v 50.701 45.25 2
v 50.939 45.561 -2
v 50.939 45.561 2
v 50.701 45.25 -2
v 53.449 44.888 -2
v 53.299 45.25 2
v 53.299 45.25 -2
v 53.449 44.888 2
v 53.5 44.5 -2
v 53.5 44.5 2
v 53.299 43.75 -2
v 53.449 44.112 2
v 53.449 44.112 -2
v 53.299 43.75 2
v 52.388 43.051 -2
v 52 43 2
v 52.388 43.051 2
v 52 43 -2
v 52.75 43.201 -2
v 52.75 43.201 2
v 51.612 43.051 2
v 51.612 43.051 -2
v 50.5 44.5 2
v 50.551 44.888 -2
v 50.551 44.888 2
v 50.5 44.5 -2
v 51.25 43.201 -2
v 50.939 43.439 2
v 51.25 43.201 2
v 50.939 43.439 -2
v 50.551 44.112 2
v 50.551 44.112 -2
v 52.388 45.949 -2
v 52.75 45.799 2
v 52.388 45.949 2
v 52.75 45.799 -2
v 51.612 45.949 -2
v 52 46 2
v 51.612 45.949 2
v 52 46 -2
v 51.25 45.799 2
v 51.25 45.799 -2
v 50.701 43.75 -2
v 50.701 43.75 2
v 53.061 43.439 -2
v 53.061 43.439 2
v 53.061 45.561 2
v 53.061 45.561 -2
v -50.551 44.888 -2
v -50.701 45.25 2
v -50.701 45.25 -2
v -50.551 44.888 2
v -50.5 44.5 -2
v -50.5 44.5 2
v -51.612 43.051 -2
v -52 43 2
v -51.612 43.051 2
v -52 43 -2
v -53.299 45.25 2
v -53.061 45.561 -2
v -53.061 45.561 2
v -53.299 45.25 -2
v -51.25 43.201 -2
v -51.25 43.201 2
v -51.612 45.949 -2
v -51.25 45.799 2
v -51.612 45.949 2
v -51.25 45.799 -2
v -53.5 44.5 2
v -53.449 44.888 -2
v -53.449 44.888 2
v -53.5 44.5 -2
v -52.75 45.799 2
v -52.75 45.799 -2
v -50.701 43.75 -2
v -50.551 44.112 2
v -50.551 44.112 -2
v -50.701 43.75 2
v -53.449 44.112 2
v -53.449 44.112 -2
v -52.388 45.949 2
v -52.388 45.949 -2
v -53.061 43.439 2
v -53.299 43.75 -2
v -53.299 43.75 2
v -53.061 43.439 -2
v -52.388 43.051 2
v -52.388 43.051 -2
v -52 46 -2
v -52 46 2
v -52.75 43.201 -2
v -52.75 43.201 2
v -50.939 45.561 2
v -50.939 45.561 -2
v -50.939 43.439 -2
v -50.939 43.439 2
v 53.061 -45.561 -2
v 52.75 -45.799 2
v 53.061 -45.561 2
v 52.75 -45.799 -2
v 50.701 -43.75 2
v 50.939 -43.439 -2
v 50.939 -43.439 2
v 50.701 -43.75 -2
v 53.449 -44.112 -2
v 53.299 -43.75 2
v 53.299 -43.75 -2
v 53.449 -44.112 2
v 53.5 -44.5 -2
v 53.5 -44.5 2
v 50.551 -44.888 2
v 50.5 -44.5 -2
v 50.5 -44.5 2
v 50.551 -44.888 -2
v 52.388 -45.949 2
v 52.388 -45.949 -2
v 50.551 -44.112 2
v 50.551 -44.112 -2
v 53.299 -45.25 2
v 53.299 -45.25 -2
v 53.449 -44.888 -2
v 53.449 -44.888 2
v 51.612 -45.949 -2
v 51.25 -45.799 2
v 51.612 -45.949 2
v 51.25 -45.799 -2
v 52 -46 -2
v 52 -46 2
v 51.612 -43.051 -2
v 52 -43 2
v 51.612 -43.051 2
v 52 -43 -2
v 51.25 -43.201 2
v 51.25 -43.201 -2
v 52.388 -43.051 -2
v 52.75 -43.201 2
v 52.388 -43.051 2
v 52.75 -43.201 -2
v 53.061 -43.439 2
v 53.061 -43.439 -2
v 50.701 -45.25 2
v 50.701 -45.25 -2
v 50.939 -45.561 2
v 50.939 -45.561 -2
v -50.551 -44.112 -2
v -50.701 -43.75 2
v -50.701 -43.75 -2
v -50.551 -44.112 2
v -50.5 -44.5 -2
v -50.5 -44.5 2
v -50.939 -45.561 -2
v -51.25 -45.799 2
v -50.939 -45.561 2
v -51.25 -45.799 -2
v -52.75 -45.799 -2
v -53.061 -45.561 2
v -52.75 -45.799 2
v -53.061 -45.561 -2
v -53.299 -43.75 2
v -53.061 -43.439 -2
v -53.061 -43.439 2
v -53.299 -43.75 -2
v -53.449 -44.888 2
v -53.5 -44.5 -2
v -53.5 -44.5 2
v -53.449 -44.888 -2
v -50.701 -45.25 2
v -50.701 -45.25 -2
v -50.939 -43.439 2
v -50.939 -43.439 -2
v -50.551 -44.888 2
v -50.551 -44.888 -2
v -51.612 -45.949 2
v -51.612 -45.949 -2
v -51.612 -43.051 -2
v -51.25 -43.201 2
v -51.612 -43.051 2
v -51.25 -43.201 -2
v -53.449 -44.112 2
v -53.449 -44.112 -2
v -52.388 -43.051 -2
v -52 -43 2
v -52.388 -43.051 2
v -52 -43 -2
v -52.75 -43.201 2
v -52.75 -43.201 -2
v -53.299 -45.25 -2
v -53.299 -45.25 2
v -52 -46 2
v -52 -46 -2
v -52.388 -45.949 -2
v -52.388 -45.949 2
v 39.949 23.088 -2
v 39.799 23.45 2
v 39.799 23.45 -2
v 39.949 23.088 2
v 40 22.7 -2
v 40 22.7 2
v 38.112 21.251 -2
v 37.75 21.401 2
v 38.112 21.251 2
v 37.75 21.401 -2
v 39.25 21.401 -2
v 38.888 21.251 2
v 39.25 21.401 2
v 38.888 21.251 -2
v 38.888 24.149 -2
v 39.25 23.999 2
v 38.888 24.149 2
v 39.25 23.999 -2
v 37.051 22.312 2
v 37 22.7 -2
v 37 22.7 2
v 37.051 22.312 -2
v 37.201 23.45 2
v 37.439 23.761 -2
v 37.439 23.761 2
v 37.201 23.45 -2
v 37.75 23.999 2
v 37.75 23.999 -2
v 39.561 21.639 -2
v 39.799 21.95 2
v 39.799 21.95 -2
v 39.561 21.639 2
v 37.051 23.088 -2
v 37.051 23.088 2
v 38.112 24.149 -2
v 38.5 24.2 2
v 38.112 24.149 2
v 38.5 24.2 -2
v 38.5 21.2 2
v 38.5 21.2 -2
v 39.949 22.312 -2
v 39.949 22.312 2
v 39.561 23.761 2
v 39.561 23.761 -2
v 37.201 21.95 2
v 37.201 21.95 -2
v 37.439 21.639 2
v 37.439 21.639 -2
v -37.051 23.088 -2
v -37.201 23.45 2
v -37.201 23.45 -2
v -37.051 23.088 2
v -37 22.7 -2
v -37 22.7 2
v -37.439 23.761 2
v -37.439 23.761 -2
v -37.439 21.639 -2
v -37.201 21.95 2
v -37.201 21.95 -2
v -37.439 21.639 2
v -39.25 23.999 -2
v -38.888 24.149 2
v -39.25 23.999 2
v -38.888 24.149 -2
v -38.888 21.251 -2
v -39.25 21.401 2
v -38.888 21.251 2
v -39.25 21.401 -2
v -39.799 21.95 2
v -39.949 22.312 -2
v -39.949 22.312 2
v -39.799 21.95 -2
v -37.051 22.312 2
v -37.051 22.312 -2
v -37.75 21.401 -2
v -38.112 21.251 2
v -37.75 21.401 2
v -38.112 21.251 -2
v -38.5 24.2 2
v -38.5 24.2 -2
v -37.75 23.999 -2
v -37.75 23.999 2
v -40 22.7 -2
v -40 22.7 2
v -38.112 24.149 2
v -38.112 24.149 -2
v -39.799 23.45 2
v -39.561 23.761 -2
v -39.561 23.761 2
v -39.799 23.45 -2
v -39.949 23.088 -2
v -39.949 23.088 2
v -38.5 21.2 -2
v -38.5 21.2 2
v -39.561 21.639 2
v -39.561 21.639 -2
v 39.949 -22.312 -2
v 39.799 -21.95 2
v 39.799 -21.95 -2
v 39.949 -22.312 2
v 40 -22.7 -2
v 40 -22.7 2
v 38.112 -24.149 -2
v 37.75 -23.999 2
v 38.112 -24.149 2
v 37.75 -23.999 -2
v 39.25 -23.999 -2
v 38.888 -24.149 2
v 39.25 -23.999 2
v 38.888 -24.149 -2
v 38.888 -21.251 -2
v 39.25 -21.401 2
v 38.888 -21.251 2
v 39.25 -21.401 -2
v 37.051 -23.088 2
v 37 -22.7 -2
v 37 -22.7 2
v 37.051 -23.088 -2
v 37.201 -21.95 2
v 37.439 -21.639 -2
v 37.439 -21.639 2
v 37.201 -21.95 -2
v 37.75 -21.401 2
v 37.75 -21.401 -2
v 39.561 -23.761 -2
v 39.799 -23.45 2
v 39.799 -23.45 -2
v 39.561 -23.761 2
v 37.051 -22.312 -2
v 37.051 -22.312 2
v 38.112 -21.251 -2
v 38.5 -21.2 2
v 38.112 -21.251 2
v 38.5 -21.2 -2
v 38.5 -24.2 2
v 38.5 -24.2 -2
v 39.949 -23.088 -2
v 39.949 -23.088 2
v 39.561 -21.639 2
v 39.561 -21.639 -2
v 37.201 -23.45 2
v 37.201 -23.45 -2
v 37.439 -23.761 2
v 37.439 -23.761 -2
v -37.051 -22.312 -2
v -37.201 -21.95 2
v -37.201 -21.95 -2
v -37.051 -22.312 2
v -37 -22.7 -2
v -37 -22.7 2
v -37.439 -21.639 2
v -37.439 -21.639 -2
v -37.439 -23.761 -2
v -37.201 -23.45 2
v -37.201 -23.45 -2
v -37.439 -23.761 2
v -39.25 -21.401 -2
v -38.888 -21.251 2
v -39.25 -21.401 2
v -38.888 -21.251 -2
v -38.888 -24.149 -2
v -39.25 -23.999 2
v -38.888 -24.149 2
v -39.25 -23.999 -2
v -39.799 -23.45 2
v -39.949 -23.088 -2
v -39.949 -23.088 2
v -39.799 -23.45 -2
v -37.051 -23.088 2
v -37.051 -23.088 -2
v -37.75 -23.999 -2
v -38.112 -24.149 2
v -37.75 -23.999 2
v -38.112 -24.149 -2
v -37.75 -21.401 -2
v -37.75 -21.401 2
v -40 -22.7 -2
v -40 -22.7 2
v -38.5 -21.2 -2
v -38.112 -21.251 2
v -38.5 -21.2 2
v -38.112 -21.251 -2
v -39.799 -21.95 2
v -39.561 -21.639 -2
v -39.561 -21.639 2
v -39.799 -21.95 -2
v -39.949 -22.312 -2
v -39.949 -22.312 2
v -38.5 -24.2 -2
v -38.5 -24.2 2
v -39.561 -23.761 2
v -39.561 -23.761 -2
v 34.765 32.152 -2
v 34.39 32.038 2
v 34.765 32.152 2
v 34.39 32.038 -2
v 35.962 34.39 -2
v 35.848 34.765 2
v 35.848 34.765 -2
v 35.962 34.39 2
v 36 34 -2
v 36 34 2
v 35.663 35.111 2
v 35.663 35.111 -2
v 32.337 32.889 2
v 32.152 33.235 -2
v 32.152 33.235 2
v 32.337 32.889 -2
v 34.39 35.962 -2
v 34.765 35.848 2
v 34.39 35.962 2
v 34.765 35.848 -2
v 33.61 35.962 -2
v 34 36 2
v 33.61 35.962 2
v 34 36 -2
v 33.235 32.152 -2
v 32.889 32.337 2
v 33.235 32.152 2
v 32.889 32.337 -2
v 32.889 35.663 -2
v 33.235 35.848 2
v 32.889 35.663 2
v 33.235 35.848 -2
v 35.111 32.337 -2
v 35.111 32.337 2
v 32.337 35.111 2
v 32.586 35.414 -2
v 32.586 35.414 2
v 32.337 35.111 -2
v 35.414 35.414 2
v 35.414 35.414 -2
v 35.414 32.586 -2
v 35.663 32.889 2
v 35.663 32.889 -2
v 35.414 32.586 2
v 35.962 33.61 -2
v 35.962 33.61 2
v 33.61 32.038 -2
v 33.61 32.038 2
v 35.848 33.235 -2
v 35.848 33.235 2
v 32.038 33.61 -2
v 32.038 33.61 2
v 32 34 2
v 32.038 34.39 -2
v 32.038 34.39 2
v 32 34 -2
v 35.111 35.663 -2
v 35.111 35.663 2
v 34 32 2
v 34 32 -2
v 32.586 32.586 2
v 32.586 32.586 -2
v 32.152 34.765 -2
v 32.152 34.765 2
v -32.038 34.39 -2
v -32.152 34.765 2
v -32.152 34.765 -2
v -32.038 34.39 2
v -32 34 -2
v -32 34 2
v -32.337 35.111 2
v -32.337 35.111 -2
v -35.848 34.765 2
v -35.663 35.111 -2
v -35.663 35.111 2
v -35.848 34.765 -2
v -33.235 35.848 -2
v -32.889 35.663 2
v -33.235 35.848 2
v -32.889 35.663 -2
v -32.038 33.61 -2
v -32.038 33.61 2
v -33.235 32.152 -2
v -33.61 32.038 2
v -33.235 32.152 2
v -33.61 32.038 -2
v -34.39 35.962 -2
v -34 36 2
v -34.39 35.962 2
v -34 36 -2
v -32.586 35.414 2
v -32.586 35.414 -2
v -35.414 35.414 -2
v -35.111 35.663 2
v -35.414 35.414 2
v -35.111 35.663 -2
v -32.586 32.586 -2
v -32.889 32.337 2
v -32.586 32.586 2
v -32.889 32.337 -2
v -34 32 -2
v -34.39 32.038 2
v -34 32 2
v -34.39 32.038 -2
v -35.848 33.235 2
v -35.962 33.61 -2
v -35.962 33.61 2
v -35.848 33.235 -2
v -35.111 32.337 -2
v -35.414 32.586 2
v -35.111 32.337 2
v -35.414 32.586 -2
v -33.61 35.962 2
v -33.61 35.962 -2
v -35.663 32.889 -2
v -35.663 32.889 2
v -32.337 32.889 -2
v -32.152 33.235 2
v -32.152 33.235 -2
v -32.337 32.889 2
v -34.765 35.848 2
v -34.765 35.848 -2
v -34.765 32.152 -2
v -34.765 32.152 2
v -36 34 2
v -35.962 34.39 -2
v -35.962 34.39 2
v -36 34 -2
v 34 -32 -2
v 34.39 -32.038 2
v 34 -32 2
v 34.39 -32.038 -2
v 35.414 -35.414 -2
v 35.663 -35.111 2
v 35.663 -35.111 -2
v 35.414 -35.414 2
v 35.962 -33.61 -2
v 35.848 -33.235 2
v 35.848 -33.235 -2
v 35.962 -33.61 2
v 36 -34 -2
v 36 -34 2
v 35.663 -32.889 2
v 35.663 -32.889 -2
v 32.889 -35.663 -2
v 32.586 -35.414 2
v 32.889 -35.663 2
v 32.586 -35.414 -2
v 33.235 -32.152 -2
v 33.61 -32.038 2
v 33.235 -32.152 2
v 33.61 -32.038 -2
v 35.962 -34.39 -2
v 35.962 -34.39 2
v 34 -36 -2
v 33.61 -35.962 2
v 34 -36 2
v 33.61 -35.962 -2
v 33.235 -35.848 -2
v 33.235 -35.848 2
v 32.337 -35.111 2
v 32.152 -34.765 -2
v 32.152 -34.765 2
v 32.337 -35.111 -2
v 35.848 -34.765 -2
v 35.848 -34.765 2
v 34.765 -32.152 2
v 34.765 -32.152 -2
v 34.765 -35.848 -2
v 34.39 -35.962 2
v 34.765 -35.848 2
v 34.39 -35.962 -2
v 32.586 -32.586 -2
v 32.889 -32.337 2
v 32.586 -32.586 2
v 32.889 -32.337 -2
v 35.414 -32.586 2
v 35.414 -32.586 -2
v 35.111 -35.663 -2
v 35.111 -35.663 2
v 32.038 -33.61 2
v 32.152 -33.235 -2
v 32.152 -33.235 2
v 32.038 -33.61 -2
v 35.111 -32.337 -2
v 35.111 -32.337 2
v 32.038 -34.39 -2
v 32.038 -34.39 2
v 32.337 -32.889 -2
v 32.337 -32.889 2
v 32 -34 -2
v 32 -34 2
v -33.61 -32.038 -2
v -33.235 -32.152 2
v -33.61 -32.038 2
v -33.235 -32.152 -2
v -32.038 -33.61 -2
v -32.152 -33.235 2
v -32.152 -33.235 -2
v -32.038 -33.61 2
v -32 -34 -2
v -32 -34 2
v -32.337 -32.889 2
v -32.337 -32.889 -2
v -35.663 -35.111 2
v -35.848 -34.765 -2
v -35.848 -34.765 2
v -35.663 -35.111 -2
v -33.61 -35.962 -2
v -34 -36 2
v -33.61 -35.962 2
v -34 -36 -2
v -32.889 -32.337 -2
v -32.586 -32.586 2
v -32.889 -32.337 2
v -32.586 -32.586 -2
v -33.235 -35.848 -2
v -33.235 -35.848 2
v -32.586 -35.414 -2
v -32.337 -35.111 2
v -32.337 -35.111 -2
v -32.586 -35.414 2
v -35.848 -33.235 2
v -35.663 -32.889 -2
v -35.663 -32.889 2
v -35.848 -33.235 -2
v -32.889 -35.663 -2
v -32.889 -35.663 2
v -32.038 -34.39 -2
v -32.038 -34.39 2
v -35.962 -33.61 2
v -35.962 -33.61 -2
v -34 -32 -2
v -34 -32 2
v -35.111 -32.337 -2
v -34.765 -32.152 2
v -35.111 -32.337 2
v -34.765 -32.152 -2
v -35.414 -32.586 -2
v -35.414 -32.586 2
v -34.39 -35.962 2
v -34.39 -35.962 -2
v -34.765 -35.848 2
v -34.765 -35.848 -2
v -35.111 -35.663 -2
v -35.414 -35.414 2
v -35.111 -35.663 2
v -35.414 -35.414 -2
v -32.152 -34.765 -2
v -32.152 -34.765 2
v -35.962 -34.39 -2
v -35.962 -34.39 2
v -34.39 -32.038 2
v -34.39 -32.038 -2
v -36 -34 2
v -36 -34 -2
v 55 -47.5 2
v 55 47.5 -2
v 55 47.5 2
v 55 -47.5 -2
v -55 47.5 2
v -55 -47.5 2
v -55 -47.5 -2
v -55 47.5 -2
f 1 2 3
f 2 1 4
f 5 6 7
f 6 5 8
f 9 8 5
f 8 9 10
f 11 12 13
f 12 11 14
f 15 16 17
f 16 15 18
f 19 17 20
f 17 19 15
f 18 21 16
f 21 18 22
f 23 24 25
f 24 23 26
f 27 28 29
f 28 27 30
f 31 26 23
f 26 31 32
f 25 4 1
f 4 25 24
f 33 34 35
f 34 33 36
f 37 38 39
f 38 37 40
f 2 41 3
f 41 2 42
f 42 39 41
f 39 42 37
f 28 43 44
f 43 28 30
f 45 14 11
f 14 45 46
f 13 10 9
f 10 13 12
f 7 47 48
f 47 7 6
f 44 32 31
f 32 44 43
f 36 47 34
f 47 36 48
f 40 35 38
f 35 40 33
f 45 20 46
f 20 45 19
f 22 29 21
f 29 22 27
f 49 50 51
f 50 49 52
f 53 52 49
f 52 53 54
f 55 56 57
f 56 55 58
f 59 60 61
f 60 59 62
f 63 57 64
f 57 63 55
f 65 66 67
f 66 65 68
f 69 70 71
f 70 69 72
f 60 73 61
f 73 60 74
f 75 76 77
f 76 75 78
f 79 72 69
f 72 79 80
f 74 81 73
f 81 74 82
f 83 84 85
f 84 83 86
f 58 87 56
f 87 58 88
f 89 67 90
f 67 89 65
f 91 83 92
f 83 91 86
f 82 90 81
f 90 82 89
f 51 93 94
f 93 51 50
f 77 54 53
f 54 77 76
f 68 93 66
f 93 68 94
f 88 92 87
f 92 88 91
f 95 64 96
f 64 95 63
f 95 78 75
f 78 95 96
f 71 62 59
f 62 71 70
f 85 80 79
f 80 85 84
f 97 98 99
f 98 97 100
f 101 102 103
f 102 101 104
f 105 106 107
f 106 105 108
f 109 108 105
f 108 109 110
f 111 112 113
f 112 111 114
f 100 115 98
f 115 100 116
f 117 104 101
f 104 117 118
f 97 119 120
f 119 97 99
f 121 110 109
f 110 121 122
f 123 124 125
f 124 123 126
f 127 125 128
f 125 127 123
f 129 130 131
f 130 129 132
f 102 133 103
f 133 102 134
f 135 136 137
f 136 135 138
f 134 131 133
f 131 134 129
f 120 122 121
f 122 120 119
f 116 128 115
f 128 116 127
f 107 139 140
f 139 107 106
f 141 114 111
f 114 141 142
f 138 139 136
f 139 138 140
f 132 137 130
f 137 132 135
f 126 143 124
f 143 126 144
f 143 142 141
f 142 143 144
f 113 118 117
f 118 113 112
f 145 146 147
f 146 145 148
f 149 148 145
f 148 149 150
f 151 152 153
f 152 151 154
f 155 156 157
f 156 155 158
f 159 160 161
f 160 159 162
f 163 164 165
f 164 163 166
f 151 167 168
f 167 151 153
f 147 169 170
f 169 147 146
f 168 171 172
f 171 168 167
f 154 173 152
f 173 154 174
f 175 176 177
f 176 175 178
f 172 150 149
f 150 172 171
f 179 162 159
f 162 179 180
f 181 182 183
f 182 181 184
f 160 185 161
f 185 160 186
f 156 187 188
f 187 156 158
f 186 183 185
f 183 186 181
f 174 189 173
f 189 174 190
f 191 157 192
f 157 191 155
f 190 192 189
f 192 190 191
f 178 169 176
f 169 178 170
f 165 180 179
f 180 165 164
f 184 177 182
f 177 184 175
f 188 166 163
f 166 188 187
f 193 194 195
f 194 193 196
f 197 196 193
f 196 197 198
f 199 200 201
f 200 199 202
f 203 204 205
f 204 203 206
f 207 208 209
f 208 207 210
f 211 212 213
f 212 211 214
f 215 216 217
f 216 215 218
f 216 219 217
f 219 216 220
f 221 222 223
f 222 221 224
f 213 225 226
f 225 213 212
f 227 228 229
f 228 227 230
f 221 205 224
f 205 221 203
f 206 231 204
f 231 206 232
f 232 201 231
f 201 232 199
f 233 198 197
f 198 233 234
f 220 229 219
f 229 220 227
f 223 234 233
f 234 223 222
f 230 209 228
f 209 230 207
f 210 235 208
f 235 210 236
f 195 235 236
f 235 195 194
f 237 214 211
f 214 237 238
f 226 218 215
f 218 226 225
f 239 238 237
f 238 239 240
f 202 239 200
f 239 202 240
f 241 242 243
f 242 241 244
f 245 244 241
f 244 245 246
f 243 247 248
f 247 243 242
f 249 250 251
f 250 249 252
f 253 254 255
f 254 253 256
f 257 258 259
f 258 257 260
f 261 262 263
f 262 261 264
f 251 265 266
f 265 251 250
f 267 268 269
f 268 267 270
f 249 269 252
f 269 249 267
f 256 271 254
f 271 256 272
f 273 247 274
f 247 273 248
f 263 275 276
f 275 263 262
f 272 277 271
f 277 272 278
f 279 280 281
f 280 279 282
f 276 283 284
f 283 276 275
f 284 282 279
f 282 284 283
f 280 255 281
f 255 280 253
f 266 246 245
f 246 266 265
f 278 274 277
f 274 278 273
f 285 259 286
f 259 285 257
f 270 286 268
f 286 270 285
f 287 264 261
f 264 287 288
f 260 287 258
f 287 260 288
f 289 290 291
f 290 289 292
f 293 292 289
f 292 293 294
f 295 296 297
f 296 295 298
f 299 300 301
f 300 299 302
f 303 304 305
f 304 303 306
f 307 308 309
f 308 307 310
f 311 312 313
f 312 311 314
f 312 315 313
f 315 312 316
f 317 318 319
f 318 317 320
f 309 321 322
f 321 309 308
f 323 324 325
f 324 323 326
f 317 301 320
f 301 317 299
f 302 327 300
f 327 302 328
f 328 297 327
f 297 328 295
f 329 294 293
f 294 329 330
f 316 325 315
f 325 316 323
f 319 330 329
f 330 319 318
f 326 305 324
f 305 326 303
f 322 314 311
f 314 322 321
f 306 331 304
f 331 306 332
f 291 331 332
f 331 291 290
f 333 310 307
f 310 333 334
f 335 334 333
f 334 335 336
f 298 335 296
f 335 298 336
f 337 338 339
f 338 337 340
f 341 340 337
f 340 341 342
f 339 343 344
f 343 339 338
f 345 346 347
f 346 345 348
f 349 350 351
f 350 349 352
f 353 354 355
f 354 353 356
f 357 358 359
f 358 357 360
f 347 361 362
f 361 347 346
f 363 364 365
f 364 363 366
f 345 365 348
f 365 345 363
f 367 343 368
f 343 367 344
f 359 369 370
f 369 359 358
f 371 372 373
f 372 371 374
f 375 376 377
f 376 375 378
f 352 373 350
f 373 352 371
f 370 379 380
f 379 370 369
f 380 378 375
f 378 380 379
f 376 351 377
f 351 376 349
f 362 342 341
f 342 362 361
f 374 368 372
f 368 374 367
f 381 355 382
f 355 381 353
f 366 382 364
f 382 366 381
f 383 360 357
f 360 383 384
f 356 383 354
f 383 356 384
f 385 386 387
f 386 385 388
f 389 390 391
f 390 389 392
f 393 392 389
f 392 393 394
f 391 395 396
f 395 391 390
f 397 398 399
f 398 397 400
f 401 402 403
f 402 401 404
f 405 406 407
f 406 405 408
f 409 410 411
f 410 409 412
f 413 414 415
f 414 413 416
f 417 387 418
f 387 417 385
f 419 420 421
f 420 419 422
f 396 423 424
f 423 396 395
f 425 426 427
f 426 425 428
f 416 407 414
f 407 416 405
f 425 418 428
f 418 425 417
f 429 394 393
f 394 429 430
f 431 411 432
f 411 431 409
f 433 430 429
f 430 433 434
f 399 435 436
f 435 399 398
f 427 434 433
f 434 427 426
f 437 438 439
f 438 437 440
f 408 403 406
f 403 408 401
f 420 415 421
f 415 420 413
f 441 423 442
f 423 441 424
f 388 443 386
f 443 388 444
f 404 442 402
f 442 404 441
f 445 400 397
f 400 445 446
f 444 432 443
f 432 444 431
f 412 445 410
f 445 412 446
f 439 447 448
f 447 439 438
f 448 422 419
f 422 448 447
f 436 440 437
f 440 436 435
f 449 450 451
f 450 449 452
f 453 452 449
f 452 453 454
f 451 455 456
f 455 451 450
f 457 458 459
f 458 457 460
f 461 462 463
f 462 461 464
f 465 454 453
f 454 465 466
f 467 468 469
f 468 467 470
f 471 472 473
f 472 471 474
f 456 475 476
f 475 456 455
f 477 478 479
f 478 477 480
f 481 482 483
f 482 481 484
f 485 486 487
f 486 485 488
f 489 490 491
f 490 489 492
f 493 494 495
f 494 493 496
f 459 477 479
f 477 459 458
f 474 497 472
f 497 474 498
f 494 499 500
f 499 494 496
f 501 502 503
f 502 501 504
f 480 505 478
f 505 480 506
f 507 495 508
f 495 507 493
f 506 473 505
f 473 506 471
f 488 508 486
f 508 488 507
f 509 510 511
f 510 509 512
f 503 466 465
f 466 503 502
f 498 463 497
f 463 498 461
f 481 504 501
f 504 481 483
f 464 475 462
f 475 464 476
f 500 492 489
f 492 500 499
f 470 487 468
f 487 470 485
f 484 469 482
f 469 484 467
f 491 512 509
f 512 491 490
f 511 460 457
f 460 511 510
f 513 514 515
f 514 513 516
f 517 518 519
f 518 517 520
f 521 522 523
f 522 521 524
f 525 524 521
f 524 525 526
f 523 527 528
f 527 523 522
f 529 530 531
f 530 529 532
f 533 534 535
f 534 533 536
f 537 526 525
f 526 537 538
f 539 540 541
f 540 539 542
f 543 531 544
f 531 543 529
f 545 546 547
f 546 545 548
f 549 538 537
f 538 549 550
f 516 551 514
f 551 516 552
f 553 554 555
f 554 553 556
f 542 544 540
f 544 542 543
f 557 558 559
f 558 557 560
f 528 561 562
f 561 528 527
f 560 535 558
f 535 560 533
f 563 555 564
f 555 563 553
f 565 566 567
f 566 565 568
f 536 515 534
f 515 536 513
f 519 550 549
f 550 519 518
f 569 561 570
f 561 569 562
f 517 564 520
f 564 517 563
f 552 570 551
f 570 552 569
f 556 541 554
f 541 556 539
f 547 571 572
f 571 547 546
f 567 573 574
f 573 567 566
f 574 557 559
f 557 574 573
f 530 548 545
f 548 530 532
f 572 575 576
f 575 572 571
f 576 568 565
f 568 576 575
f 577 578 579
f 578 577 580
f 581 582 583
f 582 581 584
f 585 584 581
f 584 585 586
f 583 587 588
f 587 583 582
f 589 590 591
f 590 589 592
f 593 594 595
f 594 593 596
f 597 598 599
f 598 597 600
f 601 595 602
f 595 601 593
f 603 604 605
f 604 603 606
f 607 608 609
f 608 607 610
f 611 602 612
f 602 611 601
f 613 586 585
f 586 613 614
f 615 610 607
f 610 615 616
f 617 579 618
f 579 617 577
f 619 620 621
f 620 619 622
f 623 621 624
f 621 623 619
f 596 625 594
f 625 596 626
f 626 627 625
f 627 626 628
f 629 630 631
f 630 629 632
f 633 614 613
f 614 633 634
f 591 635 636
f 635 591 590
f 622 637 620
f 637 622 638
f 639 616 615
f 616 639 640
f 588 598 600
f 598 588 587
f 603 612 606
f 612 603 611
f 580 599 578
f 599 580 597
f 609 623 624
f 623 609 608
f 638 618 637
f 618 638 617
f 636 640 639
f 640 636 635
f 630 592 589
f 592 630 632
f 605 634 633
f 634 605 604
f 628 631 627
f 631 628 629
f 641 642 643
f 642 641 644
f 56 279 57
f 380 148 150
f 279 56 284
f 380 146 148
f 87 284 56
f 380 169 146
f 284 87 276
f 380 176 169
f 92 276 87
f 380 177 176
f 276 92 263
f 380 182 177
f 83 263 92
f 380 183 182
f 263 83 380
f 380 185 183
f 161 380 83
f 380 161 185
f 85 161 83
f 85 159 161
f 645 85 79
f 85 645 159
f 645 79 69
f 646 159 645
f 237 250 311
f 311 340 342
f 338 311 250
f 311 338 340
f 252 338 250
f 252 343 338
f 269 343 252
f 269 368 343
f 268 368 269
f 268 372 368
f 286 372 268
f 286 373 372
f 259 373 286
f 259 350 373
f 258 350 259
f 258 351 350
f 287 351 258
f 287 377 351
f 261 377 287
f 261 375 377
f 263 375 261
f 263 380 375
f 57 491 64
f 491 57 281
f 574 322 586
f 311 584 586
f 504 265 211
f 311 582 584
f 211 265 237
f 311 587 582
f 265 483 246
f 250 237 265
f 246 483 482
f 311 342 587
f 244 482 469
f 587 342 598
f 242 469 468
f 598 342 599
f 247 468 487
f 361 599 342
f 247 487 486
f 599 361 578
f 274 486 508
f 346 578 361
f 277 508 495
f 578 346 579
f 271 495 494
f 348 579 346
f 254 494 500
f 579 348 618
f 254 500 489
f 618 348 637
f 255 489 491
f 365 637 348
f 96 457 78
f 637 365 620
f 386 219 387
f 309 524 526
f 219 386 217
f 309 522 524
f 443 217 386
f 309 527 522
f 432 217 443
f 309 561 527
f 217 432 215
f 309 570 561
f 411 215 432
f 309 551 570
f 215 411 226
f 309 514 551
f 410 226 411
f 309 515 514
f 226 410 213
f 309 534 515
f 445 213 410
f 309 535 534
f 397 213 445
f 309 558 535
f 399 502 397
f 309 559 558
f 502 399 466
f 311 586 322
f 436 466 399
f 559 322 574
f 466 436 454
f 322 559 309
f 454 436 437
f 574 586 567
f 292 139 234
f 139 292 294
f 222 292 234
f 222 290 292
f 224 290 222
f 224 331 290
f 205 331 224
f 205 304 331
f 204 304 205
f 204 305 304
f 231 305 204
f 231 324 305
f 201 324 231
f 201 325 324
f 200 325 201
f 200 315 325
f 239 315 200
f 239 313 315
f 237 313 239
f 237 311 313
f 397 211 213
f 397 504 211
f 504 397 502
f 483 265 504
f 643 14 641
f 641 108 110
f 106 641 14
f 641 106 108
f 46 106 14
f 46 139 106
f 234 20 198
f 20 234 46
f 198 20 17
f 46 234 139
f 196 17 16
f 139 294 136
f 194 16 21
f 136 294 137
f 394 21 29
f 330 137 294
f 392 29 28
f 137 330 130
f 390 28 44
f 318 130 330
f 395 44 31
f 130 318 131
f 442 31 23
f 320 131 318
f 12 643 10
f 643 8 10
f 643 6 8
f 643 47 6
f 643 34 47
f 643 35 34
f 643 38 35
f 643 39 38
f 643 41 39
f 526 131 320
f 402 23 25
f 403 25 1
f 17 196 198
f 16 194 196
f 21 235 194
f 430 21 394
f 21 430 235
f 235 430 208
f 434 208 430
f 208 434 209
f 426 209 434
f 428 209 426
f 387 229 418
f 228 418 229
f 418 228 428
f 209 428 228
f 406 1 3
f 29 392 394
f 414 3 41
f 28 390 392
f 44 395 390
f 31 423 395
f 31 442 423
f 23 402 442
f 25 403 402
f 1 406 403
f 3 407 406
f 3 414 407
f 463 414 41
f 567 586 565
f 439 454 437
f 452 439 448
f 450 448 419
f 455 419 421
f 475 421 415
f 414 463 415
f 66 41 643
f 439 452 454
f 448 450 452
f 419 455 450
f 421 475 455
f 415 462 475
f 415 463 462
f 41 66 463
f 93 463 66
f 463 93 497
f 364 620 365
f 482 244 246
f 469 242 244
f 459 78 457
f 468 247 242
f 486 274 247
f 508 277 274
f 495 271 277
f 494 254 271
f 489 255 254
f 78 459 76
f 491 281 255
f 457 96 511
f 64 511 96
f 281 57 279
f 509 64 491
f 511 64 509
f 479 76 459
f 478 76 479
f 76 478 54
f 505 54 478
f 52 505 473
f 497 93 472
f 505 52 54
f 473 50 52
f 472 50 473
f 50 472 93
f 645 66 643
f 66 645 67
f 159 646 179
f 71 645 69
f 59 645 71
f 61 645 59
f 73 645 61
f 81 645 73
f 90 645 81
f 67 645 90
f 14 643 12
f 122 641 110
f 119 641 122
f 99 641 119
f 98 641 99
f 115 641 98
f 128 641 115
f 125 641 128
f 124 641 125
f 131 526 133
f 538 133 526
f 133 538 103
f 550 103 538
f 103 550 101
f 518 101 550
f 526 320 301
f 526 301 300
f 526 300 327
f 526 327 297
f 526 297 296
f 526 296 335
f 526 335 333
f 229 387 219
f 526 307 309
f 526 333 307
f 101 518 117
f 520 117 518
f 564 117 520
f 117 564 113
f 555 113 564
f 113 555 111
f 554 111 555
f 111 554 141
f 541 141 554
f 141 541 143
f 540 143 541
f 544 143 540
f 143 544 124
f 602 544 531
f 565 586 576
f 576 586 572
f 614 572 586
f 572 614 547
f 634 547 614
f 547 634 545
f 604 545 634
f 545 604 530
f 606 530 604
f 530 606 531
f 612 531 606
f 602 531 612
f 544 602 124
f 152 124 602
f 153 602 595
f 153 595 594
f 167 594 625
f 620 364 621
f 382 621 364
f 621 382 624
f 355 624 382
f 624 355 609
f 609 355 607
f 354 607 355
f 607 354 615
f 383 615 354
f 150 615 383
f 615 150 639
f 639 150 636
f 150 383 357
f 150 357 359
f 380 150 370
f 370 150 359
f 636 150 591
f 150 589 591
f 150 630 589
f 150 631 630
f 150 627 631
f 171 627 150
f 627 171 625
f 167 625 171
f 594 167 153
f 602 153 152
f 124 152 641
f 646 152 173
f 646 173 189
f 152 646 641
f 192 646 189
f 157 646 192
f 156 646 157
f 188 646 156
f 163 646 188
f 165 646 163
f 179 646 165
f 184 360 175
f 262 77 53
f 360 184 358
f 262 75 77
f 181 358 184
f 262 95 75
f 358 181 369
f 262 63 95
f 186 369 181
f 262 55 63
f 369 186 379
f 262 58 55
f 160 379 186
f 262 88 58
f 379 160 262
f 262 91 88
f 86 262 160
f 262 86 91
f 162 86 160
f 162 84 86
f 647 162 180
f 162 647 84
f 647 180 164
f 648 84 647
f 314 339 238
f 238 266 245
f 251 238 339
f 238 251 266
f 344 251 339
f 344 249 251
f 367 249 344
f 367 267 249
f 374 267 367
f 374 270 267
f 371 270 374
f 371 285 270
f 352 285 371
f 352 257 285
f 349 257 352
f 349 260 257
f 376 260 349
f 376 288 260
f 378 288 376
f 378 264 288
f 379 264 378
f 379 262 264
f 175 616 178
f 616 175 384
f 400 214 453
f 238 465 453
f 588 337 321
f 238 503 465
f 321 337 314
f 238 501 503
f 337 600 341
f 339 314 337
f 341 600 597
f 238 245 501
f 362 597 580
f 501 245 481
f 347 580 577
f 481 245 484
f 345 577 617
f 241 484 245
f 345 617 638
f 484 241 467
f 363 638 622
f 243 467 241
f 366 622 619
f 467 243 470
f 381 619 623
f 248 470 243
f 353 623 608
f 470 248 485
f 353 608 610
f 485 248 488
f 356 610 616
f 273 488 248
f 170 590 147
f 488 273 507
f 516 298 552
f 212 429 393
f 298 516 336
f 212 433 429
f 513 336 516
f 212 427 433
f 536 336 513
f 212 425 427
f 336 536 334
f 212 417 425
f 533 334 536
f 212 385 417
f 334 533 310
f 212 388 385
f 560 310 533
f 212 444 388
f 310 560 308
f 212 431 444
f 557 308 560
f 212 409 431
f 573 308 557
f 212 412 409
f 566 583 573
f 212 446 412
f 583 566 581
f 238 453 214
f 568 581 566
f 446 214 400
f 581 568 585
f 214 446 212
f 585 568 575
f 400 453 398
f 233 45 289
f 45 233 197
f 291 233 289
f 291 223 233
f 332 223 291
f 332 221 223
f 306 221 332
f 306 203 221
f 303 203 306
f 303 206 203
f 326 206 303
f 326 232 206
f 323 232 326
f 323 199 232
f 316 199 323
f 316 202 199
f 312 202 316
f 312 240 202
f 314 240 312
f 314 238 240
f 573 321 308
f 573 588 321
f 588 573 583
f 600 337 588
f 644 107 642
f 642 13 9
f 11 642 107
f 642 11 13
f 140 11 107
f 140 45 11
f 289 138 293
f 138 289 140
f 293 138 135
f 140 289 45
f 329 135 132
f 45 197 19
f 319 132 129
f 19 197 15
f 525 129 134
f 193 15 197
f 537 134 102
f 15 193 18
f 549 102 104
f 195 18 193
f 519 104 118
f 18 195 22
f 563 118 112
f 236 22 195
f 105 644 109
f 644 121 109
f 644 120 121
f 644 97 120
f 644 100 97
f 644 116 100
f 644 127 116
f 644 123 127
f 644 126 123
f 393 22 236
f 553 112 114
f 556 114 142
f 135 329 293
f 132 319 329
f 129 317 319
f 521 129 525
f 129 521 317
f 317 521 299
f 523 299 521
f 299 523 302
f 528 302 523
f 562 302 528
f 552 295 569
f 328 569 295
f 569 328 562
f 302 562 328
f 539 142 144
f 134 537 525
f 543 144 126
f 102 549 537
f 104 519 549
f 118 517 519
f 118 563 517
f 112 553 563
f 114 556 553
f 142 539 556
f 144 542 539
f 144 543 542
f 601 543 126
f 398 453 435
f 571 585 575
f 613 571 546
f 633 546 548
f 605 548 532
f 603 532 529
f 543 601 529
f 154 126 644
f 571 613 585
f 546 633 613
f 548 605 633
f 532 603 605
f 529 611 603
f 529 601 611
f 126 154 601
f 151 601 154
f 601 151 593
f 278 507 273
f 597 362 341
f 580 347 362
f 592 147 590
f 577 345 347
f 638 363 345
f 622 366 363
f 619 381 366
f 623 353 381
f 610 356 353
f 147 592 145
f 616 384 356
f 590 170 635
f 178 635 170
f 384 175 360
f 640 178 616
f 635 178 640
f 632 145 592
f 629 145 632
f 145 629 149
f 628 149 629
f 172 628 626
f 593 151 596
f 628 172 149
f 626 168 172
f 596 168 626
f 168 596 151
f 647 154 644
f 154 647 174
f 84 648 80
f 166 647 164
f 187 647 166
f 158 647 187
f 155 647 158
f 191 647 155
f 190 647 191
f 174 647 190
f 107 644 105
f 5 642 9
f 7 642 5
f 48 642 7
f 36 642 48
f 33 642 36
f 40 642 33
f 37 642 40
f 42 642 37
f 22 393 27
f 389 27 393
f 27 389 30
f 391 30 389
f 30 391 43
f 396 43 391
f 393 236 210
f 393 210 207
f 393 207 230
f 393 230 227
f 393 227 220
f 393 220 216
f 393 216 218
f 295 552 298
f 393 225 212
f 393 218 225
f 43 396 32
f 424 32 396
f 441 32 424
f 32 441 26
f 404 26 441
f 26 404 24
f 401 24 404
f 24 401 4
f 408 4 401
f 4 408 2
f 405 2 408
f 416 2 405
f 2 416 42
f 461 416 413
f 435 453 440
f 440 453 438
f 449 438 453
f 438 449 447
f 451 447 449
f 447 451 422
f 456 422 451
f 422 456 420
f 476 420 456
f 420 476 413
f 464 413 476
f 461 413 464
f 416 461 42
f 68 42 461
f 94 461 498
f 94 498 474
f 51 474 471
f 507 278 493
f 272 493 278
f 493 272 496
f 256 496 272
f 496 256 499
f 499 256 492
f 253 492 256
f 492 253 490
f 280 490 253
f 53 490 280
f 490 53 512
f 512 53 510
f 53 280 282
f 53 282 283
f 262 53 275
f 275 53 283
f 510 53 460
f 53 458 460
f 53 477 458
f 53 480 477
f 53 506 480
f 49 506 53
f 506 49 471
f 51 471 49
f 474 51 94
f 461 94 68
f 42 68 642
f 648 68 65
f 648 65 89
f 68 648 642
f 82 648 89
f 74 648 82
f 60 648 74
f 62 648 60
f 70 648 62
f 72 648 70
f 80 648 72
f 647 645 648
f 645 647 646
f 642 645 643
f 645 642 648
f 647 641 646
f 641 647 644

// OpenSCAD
// Baseplate for Parallela board with fan

$fa = 1;
$fs = 0.4;

eps = 0.01;

// Dimensions rectangular plate
// with standoff holes
length = 110.0;
width  = 95.0;
height =  4.0;
standoff_diameter = 3.0;
standoff_x_dist = length - 2*standoff_diameter;
standoff_y_dist = width - 2*standoff_diameter;

// Parallela board mounting holes
parallela_hole_diameter = 3.0;
parallela_hole_x_dist = 83.0 - 2*parallela_hole_diameter;
parallela_hole_y_dist = 51.4 - 2*parallela_hole_diameter;

// Fan mounting holes (rectangular)
fan_hole_diameter = 4.0;
fan_hole_dist = 76.0 - 2*fan_hole_diameter;

difference() {
    cube([length,width,height], center=true);
    
    union() {
        // Standoff holes
        union() {
            translate([standoff_x_dist/2,standoff_y_dist/2,0]) cylinder(h=height+2*eps, r=standoff_diameter/2, center=true);
            translate([-standoff_x_dist/2,standoff_y_dist/2,0]) cylinder(h=height+2*eps, r=standoff_diameter/2, center=true);
            translate([standoff_x_dist/2,-standoff_y_dist/2,0]) cylinder(h=height+2*eps, r=standoff_diameter/2, center=true);
            translate([-standoff_x_dist/2,-standoff_y_dist/2,0]) cylinder(h=height+2*eps, r=standoff_diameter/2, center=true);
        }
        
        // Parallela board mounting holes
        union() {
            translate([parallela_hole_x_dist/2,parallela_hole_y_dist/2,0]) cylinder(h=height+2*eps, r=parallela_hole_diameter/2, center=true);
            translate([-parallela_hole_x_dist/2,parallela_hole_y_dist/2,0]) cylinder(h=height+2*eps, r=parallela_hole_diameter/2, center=true);
            translate([parallela_hole_x_dist/2,-parallela_hole_y_dist/2,0]) cylinder(h=height+2*eps, r=parallela_hole_diameter/2, center=true);
            translate([-parallela_hole_x_dist/2,-parallela_hole_y_dist/2,0]) cylinder(h=height+2*eps, r=parallela_hole_diameter/2, center=true);
        }
        
        // Fan mounting holes
        union() {
            translate([fan_hole_dist/2,fan_hole_dist/2,0]) cylinder(h=height+2*eps, r=fan_hole_diameter/2, center=true);
            translate([-fan_hole_dist/2,fan_hole_dist/2,0]) cylinder(h=height+2*eps, r=fan_hole_diameter/2, center=true);
            translate([fan_hole_dist/2,-fan_hole_dist/2,0]) cylinder(h=height+2*eps, r=fan_hole_diameter/2, center=true);
            translate([-fan_hole_dist/2,-fan_hole_dist/2,0]) cylinder(h=height+2*eps, r=fan_hole_diameter/2, center=true);
        }
    }
}
